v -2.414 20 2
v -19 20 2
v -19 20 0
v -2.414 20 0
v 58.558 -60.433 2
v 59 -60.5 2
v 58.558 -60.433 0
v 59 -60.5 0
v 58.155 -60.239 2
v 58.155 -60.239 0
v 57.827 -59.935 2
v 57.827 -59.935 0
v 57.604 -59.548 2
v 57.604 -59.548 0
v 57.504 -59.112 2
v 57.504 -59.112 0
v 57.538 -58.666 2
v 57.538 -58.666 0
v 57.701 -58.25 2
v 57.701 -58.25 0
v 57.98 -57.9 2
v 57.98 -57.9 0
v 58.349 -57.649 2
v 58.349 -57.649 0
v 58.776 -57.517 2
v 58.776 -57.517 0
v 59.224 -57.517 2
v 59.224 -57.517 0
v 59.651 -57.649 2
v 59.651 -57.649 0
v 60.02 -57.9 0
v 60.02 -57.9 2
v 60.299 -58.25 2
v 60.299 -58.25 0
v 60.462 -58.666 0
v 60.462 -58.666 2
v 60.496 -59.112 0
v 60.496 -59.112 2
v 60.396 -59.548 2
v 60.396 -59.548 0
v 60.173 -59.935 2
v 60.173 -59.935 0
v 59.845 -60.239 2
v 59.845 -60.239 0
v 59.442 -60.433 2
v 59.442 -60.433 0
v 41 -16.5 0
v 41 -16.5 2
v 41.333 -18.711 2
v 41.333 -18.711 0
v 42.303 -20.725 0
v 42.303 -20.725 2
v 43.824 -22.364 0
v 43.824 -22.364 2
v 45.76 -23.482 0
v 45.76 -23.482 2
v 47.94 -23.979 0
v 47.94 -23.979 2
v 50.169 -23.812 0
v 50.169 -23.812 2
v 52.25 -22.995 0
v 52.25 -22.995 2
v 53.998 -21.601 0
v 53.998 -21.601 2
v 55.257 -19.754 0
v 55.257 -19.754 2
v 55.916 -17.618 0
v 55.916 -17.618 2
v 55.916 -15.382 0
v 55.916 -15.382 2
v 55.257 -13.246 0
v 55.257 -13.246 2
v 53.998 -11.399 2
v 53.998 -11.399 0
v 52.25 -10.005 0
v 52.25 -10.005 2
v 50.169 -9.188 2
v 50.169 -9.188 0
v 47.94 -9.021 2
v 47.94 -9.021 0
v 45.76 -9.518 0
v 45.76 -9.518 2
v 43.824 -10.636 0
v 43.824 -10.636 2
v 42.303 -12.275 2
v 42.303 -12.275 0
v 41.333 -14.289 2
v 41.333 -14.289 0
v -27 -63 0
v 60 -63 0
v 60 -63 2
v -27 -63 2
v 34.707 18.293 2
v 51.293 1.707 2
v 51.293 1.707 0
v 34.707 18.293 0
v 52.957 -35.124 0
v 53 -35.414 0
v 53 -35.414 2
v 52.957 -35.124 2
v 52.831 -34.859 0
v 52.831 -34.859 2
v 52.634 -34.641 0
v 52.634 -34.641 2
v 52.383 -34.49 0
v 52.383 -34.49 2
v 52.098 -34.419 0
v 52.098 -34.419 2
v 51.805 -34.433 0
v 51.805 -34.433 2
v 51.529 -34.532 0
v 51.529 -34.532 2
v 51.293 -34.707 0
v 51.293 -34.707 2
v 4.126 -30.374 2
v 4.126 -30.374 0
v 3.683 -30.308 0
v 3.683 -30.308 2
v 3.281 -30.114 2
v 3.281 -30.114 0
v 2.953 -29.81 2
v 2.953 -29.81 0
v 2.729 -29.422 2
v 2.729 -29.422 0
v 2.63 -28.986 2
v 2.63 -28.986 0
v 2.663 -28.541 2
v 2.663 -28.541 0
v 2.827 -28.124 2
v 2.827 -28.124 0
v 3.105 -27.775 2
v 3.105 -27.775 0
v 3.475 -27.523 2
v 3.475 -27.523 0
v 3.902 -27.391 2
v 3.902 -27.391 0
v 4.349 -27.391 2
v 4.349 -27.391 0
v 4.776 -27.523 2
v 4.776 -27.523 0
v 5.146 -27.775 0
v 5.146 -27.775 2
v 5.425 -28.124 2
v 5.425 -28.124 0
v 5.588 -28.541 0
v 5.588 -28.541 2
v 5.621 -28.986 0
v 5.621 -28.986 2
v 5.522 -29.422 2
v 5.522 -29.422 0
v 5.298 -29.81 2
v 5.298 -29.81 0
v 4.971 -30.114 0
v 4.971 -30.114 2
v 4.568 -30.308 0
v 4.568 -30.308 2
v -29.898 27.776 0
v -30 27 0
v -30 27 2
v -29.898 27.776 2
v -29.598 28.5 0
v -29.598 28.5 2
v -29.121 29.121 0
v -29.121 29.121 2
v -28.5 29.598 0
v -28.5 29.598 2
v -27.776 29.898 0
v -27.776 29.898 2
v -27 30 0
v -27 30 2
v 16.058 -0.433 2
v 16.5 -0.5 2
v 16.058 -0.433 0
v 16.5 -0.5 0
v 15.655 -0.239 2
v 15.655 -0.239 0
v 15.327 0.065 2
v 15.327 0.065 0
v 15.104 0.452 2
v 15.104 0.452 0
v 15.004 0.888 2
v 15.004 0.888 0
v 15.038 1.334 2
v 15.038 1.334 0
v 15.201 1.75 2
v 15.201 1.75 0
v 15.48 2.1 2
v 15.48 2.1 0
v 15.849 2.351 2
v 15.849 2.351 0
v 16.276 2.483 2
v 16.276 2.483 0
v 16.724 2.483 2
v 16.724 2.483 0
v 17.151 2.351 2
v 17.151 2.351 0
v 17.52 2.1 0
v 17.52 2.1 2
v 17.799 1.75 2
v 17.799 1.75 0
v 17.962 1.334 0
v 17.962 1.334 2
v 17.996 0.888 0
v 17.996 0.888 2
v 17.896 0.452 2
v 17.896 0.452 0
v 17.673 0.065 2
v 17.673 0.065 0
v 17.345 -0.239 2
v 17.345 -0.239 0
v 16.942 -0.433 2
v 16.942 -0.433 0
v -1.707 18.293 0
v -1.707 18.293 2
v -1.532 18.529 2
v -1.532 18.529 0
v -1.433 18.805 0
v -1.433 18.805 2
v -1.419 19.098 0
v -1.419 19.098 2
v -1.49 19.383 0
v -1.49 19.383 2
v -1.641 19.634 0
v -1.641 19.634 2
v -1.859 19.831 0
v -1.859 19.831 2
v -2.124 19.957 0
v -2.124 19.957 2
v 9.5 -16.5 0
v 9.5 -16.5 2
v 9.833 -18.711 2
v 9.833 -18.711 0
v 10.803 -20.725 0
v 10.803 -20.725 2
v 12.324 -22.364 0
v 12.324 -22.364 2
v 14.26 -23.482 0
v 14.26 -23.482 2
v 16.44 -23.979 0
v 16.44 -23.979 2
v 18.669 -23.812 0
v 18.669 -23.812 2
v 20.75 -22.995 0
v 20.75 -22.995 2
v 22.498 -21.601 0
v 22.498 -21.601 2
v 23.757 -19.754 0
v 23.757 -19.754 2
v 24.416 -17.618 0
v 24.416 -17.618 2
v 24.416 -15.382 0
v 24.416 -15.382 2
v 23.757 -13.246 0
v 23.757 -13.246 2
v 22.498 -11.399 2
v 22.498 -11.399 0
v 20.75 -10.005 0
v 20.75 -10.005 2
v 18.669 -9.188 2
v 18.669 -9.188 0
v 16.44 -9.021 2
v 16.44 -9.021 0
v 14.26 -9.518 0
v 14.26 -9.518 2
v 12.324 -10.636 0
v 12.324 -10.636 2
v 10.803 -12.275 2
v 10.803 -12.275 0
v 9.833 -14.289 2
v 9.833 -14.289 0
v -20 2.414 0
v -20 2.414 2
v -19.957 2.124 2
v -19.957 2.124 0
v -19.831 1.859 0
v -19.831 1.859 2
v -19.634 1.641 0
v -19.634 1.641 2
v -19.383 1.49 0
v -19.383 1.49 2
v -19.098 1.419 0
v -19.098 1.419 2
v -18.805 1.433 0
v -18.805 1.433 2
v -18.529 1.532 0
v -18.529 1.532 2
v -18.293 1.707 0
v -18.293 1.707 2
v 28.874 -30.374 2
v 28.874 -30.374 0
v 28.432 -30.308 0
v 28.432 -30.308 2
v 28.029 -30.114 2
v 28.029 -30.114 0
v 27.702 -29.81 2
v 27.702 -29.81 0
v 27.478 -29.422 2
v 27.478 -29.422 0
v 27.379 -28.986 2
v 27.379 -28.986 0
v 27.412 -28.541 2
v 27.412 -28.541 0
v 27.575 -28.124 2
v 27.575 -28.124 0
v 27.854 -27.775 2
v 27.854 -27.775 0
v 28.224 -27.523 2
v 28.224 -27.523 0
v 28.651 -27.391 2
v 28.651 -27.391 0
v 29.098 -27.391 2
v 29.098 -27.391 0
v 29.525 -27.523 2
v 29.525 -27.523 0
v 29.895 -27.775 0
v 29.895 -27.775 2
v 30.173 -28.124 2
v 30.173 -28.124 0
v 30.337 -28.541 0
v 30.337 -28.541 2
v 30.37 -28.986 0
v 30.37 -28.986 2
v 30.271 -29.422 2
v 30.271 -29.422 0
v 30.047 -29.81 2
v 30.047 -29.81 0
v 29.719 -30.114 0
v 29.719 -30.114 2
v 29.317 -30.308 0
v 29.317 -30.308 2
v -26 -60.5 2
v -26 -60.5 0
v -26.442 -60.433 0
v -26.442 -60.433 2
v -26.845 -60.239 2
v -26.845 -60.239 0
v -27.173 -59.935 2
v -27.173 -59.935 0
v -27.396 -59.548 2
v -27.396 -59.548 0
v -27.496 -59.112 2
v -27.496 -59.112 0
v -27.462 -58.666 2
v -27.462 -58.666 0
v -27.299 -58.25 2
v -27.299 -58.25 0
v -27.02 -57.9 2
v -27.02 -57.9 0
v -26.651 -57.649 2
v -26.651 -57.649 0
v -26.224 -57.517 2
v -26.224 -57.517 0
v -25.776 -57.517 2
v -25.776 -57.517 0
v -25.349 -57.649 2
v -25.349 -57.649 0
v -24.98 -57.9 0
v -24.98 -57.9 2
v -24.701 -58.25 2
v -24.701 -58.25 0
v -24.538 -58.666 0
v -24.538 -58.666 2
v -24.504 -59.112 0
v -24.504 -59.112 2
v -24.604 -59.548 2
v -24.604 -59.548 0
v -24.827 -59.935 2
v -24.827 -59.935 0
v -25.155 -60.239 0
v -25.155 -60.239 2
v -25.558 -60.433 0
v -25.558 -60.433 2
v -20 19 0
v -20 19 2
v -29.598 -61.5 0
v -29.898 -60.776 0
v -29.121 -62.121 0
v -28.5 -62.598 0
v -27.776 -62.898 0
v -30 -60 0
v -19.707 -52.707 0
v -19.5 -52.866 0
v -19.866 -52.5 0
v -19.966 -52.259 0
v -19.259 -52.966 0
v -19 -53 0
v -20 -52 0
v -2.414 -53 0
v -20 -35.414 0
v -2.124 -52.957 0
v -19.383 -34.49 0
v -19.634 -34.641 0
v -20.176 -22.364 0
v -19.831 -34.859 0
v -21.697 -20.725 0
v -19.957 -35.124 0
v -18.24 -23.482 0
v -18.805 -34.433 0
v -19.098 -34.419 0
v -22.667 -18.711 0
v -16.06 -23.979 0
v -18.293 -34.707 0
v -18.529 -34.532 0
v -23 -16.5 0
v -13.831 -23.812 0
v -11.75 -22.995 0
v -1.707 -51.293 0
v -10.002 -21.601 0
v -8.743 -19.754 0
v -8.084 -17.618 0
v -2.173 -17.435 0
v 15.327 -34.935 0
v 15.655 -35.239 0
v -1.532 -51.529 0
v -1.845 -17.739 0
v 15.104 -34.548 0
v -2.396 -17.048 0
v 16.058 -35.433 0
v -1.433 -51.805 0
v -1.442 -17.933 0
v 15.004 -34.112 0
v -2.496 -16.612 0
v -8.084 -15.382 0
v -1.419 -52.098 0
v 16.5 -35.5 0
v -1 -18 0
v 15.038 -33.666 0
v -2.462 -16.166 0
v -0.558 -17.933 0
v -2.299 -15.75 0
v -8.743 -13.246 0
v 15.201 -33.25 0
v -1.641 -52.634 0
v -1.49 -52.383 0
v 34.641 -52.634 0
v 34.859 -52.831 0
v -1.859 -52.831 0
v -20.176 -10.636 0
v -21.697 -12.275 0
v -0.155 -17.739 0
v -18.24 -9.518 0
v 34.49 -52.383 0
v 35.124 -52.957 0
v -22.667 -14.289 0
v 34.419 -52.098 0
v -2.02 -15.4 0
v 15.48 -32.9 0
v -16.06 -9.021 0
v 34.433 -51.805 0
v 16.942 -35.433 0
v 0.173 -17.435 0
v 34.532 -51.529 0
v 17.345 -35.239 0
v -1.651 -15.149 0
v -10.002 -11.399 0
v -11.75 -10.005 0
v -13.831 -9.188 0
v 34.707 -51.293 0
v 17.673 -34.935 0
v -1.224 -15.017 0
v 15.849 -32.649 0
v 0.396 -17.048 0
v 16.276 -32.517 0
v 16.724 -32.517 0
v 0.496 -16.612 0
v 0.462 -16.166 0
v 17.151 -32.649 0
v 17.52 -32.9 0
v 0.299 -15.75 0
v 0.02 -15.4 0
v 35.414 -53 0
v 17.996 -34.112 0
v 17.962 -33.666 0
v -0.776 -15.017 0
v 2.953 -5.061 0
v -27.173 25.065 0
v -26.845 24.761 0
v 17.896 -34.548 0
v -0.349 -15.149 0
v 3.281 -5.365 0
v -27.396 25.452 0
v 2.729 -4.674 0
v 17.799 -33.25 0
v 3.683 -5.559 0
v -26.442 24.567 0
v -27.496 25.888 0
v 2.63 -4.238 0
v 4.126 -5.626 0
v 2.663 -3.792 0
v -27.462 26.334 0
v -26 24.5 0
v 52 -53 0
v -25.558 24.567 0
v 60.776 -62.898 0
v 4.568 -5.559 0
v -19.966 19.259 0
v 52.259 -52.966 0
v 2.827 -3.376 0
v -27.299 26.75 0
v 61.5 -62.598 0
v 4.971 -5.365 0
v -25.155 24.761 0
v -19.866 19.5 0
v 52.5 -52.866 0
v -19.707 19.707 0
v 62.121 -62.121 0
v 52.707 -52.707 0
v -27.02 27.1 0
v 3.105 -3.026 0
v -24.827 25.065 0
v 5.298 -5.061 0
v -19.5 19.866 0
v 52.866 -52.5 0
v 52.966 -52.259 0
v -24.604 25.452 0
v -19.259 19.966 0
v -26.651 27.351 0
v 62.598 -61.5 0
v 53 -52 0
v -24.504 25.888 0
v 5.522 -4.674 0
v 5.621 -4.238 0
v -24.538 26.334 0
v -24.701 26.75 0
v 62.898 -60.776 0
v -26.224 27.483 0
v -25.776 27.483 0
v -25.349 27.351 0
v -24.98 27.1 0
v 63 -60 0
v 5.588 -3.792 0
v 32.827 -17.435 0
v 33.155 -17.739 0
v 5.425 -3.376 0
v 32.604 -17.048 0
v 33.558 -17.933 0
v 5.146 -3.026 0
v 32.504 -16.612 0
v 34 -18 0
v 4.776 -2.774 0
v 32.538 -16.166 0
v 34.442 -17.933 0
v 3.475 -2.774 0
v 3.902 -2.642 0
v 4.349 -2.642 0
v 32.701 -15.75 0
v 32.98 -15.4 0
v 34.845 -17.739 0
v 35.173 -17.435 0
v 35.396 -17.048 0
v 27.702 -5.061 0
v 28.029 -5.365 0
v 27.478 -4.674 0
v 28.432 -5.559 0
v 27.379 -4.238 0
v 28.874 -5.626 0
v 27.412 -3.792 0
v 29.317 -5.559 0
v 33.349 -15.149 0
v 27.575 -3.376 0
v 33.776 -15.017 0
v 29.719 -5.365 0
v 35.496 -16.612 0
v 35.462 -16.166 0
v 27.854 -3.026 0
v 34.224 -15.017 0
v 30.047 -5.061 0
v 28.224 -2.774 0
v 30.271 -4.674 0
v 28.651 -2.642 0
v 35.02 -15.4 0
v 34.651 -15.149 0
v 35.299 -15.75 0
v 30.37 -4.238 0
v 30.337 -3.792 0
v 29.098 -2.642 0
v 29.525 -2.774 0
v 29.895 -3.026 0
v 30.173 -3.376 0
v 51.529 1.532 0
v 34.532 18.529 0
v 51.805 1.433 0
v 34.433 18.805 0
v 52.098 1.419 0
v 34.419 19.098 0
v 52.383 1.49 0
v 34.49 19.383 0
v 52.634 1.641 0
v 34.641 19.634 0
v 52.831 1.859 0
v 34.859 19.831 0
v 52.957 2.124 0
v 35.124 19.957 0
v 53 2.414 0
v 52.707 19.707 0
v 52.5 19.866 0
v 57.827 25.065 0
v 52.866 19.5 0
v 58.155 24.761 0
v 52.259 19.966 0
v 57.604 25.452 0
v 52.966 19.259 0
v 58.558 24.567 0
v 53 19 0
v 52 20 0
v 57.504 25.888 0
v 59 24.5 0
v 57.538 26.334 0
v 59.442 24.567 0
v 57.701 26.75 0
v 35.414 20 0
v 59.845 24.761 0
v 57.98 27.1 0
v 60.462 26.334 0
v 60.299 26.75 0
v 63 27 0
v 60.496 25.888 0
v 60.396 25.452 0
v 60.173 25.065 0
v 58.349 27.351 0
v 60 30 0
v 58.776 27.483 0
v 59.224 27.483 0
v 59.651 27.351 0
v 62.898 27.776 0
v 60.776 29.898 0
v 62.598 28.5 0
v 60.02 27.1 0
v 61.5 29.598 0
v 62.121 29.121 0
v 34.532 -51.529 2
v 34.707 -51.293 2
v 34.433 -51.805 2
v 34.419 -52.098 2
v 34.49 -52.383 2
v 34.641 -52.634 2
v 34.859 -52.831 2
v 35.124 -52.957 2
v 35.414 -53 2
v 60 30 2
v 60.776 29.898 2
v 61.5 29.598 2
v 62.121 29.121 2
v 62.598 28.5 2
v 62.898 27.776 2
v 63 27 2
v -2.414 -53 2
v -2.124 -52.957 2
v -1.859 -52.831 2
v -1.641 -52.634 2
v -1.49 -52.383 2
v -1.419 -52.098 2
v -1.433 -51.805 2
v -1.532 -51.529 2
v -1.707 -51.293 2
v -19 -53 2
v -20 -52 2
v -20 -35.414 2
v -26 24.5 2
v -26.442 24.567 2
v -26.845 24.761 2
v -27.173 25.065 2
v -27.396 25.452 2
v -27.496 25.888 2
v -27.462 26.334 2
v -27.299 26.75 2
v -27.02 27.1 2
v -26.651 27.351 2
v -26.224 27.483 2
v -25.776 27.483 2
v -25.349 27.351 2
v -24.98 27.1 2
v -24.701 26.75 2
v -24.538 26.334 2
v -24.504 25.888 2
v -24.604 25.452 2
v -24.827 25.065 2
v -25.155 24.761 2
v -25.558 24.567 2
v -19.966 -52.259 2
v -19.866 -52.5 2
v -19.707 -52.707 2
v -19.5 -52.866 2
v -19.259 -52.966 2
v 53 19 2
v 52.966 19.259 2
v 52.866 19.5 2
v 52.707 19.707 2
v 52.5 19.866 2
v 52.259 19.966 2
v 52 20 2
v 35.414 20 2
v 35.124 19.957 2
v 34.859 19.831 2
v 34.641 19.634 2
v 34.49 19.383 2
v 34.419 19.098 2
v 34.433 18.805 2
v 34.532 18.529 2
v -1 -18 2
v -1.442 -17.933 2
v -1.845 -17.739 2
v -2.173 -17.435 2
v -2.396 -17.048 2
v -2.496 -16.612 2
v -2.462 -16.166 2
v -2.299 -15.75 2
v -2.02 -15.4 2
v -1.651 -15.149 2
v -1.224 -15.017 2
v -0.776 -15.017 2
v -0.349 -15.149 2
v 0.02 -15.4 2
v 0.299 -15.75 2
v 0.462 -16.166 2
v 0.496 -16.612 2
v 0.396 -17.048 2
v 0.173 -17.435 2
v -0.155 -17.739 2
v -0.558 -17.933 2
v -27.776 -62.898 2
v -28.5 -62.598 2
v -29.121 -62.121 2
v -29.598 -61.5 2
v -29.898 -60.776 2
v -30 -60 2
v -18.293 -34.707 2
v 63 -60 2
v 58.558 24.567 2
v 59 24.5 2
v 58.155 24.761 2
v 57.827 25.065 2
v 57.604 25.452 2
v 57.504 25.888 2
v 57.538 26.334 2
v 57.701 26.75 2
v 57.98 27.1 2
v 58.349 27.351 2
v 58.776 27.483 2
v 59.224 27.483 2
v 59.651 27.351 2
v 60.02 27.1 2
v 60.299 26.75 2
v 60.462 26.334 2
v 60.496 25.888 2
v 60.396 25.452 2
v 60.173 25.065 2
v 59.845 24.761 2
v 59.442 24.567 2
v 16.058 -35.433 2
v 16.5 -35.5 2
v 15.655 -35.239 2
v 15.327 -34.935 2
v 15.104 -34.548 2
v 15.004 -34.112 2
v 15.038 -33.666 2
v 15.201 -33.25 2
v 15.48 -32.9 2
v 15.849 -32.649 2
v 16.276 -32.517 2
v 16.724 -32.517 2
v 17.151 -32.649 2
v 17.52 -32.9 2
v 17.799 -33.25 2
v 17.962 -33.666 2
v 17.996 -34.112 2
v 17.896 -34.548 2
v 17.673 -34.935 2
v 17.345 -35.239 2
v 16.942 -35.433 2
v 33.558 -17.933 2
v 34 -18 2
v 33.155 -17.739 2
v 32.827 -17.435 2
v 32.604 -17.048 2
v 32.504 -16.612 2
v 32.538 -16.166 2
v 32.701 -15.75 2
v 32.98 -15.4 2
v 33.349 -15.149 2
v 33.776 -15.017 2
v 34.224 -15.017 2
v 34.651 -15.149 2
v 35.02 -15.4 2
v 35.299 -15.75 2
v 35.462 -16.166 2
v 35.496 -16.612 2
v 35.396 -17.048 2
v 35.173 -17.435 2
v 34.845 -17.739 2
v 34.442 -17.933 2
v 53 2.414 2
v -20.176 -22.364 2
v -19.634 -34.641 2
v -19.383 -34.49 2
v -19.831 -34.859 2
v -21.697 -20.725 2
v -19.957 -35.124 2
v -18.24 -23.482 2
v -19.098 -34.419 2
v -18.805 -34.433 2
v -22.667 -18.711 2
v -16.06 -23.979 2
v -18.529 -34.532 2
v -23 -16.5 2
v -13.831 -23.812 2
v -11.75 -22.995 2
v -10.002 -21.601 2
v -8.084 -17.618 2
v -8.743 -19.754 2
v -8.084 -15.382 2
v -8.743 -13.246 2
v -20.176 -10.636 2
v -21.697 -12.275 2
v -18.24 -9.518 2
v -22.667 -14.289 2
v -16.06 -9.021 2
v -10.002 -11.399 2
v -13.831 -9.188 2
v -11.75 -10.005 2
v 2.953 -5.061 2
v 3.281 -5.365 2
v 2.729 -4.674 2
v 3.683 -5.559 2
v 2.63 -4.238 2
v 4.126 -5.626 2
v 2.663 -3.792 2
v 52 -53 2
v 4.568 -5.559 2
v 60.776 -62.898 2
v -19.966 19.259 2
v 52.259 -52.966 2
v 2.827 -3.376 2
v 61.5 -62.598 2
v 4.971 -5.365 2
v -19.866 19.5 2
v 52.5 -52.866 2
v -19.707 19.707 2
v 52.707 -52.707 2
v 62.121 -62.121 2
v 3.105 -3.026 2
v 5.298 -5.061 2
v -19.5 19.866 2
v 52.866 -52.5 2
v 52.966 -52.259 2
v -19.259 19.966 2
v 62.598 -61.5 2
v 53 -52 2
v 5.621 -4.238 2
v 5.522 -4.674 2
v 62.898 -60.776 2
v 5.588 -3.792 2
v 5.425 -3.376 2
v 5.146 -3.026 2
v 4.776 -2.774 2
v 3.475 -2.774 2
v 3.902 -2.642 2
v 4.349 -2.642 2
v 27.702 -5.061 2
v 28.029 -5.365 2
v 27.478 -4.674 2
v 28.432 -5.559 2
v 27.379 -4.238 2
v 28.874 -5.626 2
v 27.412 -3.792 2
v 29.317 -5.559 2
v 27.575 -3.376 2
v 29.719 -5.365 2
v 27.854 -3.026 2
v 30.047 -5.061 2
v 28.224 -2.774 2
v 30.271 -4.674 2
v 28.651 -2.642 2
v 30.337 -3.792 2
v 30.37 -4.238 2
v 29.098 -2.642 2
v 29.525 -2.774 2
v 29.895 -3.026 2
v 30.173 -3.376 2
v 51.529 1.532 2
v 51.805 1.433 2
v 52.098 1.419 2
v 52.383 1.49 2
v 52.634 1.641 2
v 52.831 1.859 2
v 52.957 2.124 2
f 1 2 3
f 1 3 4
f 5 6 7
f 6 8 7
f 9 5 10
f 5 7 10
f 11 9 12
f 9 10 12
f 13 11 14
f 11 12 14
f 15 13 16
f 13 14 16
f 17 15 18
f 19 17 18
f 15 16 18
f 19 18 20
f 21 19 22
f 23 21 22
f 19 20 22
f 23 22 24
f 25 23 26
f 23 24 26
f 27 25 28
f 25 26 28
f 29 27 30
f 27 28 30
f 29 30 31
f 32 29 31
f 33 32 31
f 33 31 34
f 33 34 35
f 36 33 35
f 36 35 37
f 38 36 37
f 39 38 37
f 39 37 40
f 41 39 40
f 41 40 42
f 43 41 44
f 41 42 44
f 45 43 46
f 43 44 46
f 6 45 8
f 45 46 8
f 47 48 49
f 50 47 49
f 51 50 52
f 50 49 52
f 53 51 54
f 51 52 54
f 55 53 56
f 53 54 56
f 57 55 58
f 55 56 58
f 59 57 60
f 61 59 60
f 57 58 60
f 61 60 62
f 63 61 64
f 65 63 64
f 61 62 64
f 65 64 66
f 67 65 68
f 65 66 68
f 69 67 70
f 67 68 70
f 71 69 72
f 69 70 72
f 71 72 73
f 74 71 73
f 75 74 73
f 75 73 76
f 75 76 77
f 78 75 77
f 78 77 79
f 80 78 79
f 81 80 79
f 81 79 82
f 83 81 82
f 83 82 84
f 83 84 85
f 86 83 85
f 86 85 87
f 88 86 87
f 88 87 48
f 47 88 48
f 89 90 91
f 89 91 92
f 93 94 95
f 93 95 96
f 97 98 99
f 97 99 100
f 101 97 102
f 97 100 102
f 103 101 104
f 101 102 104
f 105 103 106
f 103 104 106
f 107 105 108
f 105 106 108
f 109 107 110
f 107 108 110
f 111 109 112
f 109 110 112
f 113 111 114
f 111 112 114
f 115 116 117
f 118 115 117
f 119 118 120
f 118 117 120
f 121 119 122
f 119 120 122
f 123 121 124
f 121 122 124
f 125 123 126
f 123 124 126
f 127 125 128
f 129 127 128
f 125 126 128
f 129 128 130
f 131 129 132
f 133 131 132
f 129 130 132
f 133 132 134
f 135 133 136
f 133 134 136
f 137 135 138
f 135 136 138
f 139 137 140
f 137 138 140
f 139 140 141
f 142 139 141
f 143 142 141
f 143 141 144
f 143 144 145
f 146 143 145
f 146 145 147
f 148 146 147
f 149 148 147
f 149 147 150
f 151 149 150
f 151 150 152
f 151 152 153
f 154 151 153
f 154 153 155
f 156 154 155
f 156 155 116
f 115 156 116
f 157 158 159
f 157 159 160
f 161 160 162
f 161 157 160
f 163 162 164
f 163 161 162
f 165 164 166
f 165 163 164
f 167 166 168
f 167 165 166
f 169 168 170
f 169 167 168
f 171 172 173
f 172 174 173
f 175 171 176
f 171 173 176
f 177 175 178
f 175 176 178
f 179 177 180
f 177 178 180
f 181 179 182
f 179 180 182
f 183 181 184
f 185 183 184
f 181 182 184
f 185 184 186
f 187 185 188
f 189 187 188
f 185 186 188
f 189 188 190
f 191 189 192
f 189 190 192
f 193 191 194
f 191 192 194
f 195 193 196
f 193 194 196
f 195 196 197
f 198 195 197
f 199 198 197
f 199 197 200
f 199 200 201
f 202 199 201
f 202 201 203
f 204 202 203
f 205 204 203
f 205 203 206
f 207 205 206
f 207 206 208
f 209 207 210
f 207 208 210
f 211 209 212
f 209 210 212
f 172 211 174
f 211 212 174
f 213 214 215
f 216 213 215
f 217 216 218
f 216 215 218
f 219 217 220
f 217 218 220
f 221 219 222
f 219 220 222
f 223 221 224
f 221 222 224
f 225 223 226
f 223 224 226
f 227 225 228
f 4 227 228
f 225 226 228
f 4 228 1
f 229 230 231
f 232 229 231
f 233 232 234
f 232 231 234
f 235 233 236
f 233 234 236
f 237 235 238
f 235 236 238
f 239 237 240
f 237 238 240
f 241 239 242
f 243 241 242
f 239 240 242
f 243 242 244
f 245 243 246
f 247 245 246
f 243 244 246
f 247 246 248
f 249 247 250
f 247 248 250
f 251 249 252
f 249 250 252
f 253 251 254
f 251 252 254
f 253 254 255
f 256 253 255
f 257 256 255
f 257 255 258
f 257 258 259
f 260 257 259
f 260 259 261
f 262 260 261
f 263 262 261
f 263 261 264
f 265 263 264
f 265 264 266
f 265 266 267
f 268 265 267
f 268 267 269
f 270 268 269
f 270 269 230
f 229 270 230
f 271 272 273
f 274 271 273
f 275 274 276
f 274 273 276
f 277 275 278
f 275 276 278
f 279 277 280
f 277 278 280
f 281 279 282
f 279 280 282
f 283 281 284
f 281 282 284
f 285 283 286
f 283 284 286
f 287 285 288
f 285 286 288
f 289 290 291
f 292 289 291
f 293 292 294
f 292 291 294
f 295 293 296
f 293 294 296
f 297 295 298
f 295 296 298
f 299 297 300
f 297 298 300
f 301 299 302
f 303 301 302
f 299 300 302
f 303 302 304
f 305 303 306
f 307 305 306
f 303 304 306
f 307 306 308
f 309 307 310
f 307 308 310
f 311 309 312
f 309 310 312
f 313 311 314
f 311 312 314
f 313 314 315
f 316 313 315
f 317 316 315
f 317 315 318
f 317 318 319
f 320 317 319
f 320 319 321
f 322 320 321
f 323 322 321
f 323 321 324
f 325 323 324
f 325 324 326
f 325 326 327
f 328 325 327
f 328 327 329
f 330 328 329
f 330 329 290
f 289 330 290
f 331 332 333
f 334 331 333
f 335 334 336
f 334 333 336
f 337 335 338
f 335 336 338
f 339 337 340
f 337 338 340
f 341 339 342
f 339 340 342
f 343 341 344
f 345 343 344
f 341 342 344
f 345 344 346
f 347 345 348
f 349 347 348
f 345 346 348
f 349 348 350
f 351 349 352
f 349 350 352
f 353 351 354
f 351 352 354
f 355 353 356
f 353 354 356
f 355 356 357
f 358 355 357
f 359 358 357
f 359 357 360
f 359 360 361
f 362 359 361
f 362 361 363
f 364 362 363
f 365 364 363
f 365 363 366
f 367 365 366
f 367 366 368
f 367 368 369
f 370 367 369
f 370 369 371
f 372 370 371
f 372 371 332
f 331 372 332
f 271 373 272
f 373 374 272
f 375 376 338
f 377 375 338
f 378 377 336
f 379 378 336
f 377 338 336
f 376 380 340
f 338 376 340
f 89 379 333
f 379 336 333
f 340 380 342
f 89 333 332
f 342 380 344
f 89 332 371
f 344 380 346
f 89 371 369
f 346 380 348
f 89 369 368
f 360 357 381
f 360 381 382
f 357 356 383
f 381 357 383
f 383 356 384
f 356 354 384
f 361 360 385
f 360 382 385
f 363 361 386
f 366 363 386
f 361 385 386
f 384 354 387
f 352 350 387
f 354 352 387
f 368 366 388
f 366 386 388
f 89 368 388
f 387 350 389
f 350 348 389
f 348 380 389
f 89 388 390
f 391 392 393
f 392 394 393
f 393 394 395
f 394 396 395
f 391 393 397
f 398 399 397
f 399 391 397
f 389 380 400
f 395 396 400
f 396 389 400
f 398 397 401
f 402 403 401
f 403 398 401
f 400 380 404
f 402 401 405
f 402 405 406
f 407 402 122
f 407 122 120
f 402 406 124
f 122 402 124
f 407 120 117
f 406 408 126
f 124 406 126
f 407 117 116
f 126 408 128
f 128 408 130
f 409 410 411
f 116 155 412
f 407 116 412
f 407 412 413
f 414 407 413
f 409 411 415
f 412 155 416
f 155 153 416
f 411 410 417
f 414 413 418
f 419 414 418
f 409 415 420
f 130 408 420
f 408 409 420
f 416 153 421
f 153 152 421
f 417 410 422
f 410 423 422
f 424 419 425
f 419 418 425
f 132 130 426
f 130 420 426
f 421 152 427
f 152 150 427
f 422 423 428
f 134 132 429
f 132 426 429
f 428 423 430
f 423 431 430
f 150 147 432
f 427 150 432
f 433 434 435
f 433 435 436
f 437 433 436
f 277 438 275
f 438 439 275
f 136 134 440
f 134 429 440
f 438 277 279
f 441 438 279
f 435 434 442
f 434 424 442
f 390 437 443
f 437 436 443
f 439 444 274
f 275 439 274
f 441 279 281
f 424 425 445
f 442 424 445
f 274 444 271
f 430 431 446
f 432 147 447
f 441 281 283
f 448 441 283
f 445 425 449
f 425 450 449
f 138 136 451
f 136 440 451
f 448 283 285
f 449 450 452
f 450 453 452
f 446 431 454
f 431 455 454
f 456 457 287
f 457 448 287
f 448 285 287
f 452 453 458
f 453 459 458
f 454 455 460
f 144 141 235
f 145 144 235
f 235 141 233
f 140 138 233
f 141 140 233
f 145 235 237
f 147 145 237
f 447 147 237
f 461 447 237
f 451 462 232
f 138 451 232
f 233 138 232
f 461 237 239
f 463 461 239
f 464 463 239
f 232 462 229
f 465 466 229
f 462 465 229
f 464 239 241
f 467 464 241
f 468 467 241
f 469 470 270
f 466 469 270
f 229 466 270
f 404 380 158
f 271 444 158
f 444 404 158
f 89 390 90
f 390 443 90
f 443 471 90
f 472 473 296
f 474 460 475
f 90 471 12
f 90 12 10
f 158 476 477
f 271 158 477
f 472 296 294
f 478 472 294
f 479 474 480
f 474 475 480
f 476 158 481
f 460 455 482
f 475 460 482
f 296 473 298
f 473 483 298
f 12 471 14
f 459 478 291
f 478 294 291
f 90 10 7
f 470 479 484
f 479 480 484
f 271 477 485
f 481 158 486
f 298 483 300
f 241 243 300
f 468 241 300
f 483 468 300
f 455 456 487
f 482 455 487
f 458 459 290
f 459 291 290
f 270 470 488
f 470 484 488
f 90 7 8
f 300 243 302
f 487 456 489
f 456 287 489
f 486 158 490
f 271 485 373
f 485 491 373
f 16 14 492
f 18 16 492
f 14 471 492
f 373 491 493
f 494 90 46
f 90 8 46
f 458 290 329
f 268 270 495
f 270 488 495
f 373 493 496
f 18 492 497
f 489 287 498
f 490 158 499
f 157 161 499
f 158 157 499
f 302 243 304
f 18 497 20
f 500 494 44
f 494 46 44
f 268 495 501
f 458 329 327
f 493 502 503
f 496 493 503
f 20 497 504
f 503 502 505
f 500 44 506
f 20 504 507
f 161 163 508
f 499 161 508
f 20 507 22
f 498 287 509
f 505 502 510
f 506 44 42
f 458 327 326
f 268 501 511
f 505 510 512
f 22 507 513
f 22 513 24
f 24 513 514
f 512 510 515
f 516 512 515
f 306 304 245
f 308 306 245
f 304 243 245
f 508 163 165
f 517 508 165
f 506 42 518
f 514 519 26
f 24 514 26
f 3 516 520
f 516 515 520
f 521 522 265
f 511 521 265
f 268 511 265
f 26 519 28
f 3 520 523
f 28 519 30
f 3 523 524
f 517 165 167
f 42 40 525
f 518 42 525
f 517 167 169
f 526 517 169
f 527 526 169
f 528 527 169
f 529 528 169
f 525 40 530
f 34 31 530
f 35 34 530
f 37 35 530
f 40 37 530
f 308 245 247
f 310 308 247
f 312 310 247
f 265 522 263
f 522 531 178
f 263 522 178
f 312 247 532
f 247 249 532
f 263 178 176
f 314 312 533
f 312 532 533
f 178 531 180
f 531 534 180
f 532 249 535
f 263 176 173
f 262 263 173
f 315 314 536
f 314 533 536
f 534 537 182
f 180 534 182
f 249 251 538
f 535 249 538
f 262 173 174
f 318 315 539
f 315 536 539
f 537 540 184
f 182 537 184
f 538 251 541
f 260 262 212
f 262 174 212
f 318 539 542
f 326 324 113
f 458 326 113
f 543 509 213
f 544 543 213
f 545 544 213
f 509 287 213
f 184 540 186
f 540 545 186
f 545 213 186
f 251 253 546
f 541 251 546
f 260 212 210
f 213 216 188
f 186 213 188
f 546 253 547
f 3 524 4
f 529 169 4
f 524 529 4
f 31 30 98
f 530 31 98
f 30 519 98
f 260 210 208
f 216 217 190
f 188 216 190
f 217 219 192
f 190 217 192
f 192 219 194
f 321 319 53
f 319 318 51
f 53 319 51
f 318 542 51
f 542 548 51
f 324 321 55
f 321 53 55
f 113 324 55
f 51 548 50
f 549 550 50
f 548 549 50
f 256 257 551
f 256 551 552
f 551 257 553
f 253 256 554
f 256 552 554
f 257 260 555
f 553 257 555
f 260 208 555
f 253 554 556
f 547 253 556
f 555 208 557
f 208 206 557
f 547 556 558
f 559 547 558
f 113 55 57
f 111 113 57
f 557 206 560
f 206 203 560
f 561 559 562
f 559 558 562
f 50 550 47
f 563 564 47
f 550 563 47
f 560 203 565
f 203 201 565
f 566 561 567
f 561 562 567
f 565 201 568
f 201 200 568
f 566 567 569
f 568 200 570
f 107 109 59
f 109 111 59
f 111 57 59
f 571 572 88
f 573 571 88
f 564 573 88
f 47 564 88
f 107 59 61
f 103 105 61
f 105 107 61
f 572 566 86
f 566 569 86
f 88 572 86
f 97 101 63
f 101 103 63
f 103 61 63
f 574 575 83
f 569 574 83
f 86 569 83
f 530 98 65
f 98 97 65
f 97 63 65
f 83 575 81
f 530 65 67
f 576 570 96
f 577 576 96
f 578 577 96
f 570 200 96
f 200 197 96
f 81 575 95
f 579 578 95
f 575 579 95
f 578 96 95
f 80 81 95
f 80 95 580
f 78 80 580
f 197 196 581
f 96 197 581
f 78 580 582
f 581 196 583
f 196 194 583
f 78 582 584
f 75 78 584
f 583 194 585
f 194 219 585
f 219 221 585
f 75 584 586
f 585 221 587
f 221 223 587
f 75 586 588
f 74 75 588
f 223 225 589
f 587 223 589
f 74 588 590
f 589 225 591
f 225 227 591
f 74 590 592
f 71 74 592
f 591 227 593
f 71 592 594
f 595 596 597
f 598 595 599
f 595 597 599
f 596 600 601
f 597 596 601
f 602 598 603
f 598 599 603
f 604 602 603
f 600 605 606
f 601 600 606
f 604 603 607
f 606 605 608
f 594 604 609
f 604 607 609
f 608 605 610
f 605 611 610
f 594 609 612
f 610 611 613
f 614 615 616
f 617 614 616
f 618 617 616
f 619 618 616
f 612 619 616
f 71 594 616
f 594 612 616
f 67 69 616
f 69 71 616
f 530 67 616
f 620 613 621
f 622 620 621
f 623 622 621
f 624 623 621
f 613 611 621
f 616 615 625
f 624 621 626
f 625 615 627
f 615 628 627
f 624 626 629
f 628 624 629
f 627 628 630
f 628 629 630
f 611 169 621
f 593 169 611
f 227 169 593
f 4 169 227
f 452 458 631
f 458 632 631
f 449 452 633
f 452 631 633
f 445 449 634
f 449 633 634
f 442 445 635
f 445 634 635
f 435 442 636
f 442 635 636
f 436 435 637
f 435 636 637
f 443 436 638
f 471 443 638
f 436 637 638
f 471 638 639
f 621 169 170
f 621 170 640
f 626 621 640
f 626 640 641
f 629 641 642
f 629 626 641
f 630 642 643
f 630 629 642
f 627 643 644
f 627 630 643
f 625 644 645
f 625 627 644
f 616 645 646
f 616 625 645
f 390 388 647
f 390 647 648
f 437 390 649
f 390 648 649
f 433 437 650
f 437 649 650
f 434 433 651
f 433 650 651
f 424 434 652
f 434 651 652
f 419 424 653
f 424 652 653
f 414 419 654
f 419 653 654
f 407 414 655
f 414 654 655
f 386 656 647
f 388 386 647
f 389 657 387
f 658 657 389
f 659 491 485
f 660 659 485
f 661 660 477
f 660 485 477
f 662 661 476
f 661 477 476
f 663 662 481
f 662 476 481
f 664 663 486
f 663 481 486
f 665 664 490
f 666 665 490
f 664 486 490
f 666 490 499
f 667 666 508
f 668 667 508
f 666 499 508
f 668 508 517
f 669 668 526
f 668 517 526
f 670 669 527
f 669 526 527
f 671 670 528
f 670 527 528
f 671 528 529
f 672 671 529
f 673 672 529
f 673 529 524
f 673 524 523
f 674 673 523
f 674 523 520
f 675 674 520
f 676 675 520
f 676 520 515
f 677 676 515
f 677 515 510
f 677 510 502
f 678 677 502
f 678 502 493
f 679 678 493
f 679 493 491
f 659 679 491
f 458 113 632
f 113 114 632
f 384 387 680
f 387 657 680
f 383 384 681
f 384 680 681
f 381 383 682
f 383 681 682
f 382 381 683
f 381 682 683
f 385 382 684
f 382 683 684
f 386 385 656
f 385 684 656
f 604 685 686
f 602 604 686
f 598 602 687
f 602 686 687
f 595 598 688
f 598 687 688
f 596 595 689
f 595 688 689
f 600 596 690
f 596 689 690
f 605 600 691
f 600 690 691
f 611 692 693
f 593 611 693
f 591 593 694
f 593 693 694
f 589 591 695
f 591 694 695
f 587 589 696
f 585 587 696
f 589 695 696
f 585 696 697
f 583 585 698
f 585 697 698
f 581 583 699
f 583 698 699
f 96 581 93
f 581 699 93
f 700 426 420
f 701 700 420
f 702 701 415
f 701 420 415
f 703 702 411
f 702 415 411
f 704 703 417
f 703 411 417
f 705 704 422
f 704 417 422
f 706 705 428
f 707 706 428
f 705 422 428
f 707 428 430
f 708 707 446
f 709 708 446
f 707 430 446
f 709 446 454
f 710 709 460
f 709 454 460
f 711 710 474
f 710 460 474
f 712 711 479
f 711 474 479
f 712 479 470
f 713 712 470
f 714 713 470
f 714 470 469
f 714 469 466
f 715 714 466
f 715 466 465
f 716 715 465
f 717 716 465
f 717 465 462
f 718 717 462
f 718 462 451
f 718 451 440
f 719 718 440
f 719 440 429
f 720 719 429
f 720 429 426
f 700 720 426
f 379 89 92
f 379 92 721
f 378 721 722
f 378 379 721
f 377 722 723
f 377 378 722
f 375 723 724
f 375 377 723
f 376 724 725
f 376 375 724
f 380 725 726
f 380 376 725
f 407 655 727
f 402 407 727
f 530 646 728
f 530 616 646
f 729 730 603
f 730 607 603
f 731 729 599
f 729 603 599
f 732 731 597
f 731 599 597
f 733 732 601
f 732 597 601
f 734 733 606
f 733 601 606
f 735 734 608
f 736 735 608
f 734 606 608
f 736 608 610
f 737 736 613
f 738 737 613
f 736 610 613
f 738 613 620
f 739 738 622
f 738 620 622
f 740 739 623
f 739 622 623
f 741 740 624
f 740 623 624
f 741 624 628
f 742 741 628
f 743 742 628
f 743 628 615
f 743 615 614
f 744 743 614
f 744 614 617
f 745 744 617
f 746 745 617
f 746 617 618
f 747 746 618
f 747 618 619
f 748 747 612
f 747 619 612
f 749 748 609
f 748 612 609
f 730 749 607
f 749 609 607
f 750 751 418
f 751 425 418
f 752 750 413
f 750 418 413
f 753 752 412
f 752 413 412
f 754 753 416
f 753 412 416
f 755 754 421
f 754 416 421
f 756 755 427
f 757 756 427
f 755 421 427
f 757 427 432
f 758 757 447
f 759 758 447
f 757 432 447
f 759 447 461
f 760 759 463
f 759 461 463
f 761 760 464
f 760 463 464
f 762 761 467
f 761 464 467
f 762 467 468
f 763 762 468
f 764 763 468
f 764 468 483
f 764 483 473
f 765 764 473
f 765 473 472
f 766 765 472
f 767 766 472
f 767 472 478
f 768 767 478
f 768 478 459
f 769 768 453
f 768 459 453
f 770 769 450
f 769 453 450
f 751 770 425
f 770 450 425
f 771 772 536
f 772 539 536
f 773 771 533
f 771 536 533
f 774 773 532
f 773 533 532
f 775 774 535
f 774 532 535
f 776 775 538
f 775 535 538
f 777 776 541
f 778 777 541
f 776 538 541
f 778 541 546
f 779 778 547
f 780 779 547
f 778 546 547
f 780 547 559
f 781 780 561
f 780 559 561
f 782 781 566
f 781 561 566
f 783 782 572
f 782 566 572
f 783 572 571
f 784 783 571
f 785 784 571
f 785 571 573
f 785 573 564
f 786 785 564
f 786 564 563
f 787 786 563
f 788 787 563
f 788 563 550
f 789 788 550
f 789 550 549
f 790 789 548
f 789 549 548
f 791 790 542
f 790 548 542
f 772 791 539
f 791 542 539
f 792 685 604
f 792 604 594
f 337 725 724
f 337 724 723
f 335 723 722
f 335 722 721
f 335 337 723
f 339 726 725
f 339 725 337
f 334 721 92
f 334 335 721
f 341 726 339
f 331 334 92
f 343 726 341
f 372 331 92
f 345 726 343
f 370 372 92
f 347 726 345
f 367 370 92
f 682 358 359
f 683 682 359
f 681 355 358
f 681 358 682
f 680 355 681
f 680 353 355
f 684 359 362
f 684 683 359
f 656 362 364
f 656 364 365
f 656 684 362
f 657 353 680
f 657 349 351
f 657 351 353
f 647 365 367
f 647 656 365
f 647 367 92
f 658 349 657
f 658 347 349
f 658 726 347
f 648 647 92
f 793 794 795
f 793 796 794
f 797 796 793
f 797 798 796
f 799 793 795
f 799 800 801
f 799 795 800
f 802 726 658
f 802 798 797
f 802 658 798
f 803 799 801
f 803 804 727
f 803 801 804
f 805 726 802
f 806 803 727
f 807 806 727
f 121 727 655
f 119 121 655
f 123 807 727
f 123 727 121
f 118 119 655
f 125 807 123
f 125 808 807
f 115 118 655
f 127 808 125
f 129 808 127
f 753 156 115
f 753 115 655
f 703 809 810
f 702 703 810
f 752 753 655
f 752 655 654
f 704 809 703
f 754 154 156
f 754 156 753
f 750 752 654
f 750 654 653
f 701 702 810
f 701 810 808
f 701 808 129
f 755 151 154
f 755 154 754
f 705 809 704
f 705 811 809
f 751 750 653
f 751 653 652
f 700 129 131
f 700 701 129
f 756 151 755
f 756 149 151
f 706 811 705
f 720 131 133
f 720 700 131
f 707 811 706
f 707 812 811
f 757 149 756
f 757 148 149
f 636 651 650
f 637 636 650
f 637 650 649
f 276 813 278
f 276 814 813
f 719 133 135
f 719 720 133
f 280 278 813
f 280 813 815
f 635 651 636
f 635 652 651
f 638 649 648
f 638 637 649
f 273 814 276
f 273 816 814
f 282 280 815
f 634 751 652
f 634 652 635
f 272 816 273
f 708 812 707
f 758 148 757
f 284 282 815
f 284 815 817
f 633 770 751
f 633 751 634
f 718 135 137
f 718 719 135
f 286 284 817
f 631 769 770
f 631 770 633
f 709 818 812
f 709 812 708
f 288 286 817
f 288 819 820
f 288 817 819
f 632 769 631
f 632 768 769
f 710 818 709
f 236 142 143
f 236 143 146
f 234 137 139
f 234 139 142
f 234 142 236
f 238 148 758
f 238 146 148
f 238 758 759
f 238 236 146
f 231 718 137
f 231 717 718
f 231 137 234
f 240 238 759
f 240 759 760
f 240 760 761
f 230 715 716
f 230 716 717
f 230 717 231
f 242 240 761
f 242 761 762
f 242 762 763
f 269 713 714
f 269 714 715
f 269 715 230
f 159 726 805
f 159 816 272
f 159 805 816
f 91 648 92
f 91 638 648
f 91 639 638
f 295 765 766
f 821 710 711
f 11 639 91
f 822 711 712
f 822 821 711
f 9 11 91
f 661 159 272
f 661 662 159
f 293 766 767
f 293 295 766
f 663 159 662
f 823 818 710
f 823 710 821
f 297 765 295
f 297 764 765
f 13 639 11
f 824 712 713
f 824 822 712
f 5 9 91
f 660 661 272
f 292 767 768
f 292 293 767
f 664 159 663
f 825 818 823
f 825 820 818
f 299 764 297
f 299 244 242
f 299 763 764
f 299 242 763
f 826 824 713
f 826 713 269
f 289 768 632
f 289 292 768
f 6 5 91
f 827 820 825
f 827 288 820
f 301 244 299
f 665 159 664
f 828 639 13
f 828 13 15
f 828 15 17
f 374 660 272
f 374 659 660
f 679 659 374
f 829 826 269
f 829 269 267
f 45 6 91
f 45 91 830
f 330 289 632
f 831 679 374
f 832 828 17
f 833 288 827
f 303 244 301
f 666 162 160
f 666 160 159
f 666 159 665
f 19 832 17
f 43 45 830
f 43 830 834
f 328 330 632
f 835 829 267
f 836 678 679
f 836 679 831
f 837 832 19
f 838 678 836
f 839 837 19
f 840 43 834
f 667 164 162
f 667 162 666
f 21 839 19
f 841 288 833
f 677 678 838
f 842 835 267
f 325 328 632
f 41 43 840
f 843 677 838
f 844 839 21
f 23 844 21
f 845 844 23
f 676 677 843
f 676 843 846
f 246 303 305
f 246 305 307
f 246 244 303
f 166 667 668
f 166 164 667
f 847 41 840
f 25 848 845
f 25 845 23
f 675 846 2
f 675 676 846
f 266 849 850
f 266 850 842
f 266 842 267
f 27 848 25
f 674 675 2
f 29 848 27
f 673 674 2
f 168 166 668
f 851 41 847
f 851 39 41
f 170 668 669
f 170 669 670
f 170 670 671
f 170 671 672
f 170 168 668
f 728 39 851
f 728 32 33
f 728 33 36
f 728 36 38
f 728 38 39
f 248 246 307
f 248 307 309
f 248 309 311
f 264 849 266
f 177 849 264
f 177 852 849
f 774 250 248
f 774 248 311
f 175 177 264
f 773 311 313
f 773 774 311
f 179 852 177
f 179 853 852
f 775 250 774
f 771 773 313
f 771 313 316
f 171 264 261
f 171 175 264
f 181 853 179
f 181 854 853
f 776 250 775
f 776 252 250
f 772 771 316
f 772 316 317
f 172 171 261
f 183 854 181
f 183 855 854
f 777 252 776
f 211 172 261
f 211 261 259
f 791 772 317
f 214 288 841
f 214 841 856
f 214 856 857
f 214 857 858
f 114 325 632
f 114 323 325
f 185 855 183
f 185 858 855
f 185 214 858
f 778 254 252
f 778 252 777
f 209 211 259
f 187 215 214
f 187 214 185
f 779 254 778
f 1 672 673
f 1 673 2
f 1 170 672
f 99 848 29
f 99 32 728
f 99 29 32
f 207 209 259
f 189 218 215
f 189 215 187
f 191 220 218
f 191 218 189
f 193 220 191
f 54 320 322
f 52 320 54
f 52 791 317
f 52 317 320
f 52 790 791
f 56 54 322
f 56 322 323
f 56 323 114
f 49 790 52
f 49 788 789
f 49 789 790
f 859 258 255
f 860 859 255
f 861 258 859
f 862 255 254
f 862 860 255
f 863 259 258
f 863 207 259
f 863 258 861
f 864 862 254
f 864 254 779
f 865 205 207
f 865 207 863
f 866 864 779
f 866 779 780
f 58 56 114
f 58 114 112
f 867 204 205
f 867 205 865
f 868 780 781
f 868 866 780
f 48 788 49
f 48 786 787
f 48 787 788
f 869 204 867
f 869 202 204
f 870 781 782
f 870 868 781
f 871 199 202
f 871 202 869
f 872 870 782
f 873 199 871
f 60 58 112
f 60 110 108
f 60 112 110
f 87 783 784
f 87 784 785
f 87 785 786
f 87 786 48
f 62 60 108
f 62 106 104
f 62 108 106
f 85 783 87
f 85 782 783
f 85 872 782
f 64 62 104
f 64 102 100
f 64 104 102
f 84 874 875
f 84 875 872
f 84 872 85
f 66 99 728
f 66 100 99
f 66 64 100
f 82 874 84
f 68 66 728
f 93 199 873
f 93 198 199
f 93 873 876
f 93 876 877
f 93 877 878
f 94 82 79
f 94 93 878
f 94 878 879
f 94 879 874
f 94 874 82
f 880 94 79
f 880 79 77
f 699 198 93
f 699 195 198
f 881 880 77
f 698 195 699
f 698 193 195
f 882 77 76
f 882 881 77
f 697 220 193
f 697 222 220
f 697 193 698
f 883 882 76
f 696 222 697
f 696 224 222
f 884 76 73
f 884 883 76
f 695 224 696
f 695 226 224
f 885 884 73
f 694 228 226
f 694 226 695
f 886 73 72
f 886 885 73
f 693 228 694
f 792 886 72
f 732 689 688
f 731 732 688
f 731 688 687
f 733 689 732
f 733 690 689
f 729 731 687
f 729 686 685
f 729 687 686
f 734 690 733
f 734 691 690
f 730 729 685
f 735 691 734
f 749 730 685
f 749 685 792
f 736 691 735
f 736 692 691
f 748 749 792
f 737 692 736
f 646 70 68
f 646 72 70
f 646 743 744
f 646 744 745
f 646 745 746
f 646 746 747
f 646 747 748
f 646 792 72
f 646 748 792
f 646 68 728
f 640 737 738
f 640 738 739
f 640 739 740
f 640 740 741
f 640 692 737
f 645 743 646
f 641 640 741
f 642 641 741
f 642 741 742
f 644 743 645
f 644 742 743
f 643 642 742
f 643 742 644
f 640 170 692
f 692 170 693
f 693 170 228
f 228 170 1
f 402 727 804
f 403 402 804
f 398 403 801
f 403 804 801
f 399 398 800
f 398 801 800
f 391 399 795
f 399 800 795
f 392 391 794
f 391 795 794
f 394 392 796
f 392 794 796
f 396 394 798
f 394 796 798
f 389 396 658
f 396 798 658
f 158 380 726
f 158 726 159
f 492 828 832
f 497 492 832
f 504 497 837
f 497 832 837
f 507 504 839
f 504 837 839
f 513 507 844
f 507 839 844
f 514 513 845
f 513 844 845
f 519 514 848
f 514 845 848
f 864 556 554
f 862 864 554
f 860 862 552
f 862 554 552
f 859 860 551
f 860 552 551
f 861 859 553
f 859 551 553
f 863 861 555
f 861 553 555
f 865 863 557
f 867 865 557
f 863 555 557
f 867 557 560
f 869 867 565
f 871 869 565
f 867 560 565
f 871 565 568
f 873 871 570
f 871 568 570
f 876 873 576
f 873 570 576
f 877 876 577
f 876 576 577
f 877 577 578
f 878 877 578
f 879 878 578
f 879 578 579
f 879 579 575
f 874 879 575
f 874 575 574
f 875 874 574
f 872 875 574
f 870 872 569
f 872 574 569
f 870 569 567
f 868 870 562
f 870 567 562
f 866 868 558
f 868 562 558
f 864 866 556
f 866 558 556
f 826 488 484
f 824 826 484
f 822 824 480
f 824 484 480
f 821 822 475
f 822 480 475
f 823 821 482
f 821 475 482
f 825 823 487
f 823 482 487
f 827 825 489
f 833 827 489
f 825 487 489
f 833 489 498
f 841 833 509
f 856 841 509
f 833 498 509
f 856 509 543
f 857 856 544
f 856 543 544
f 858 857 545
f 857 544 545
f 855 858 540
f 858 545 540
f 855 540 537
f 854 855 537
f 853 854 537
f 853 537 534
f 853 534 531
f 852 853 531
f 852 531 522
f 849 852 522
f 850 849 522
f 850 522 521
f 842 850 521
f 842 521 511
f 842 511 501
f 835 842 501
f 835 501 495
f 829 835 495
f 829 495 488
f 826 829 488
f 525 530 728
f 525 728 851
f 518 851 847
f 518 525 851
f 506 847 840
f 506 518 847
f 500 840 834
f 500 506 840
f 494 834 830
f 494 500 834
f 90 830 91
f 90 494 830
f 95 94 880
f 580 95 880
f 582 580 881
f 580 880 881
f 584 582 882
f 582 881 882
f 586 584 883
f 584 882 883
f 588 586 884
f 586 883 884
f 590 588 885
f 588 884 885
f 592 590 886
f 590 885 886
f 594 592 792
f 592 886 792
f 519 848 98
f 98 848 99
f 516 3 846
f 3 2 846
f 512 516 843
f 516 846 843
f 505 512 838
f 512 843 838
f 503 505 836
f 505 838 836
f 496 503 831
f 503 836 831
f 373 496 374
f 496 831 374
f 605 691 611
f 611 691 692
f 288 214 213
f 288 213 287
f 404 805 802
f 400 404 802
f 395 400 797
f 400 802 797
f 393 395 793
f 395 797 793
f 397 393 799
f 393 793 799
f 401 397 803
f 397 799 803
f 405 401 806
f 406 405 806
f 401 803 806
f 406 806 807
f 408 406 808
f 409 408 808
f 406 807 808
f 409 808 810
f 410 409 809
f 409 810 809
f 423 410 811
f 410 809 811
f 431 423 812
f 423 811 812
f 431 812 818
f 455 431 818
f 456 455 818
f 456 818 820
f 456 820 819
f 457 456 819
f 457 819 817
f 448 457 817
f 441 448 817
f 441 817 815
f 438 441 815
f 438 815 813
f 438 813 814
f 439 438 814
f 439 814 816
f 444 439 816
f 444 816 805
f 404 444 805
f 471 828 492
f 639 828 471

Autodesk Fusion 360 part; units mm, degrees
sketch "Sketch1" plane through (0, 0, 0) normal (0, 0, 1) x (1, 0, 0)
  line L0 (-27, 30) -> (60, 30)
  line L1 (63, 27) -> (63, -60)
  line L2 (60, -63) -> (-27, -63)
  line L3 (-30, -60) -> (-30, 27)
  arc A0 (-27, 30) -> (-30, 27) centre (-27, 27) ccw
  arc A1 (63, 27) -> (60, 30) centre (60, 27) ccw
  arc A2 (-30, -60) -> (-27, -63) centre (-27, -60) ccw
  arc A3 (60, -63) -> (63, -60) centre (60, -60) ccw
  point P0 (-30, 30)
  point P1 (63, 30)
  point P2 (-30, -63)
  dimension "d1" = 93
  dimension "d2" = 93
  dimension "d3" = 3
  dimension "d4" = 3
extrude "Extrude1" add sketch "Sketch1" along normal blind 2
sketch "Sketch2" plane through (0, 0, 2) normal (0, 0, 1) x (-1, 0, 0)
  arc A0 (30, 60) -> (27, 63) centre (27, 60) ccw
  line L0 (27, 63) -> (-60, 63)
  arc A1 (-60, 63) -> (-63, 60) centre (-60, 60) ccw
  line L1 (-63, 60) -> (-63, -27)
  arc A2 (-63, -27) -> (-60, -30) centre (-60, -27) ccw
  line L2 (-60, -30) -> (27, -30)
  arc A3 (27, -30) -> (30, -27) centre (27, -27) ccw
  line L3 (30, -27) -> (30, 60)
  point P0 (26, -26)
  point P1 (-59, -26)
  point P2 (26, 59)
  point P3 (-60, 60)
  point P4 (-59, 59)
  point P5 (-57.2336, -24.9323)
  dimension "d18" = 85
  dimension "d19" = 4
  dimension "d20" = 4
  dimension "d21" = 4
  dimension "d22" = 4
  dimension "d23" = 4
  dimension "d24" = 4
  dimension "d25" = 85
  dimension "d26" = 4
hole "Hole2" at (59, -59, 2) at (-26, -59, 2) at (-26, 26, 2) at (59, 26, 2) direction (0, 0, -1) diameter 3 depth 2 tip angle 118
sketch "Sketch3" plane through (0, 0, 2) normal (0, 0, 1) x (-1, 0, 0)
  line L0 (-60, -30) -> (27, -30)
  line L1 (30, -27) -> (30, 60)
  line L2 (27, 63) -> (-60, 63)
  point P0 (-16.5, 16.5)
  point P1 (-16.5, -1)
  point P2 (1, 16.5)
  point P3 (-16.5, 34)
  point P4 (-34, 16.5)
  point P5 (-28.8744, 28.8744)
  point P6 (-4.1256, 28.8744)
  point P7 (-4.1256, 4.1256)
  point P8 (-28.8744, 4.1256)
  point P9 (-34, 16.5)
  point P10 (-16.5, 34)
  point P11 (1, 16.5)
  point P12 (-16.5, -1)
  point P13 (-28.8744, 4.1256)
  point P14 (-28.8744, 28.8744)
  point P15 (-4.1256, 28.8744)
  point P16 (-4.1256, 4.1256)
  point P17 (-16.5, -1)
  point P18 (-34, 16.5)
  point P19 (-16.5, 34)
  point P20 (1, 16.5)
  point P21 (-4.1256, 4.1256)
  point P22 (-28.8744, 4.1256)
  point P23 (-28.8744, 28.8744)
  point P24 (-4.1256, 28.8744)
  point P25 (1, 16.5)
  point P26 (-16.5, -1)
  point P27 (-34, 16.5)
  point P28 (-16.5, 34)
  point P29 (-4.1256, 28.8744)
  point P30 (-4.1256, 4.1256)
  point P31 (-28.8744, 4.1256)
  point P32 (-28.8744, 28.8744)
  dimension "d30" = 46.5
  dimension "d31" = 46.5
  dimension "d32" = 17.5
  dimension "d34" = 46.5
  dimension "d35" = 46.5
  dimension "d36" = 46.5
  dimension "d38" = 46.5
  dimension "d39" = 17.5
  dimension "d40" = 17.5
  dimension "d41" = 17.5
  dimension "d47" = 360
hole "Hole3" at (16.5, -34, 2) at (-1, -16.5, 2) at (16.5, 1, 2) at (34, -16.5, 2) at (16.5, -34, 2) at (4.1256, -28.8744, 2) at (4.1256, -4.1256, 2) at (28.8744, -28.8744, 2) at (28.8744, -4.1256, 2) direction (0, 0, -1) diameter 3 depth 25 tip angle 118
sketch "Sketch4" plane through (0, 0, 2) normal (0, 0, 1) x (-1, 0, 0)
sketch "Sketch5" plane through (0, 0, 2) normal (0, 0, 1) x (-1, 0, 0)
  circle A0 centre (-28.8744, 28.8744) radius 1.5
  circle A1 centre (-4.1256, 28.8744) radius 1.5
  circle A2 centre (-34, 16.5) radius 1.5
  circle A3 centre (1, 16.5) radius 1.5
  circle A4 centre (-16.5, 34) radius 1.5
  circle A5 centre (-16.5, -1) radius 1.5
  circle A6 centre (-4.1256, 4.1256) radius 1.5
  circle A7 centre (-28.8744, 4.1256) radius 1.5
  circle A8 centre (26, -26) radius 1.5
  circle A9 centre (-59, 59) radius 1.5
  circle A10 centre (26, 59) radius 1.5
  circle A11 centre (-59, -26) radius 1.5
  arc A12 (30, 60) -> (27, 63) centre (27, 60) ccw
  line L0 (27, 63) -> (-60, 63)
  arc A13 (-60, 63) -> (-63, 60) centre (-60, 60) ccw
  line L1 (-63, 60) -> (-63, -27)
  arc A14 (-63, -27) -> (-60, -30) centre (-60, -27) ccw
  line L2 (-60, -30) -> (27, -30)
  arc A15 (27, -30) -> (30, -27) centre (27, -27) ccw
  line L3 (30, -27) -> (30, 60)
  circle A16 centre (15.5, 16.5) radius 7.5
  circle A17 centre (-48.5, 16.5) radius 7.5
  dimension "d48" = 15
  dimension "d49" = 14.5
  dimension "d50" = 46.5
  dimension "d51" = 15
  dimension "d52" = 46.5
  dimension "d53" = 14.5
extrude "Extrude2" cut sketch "Sketch5" against normal blind 9 contours A16 | A17
sketch "Sketch6" plane through (0, 0, 2) normal (0, 0, 1) x (-1, 0, 0)
  circle A0 centre (-48.5, 16.5) radius 7.5
  circle A1 centre (15.5, 16.5) radius 7.5
  circle A2 centre (-28.8744, 28.8744) radius 1.5
  circle A3 centre (-4.1256, 28.8744) radius 1.5
  circle A4 centre (-34, 16.5) radius 1.5
  circle A5 centre (1, 16.5) radius 1.5
  circle A6 centre (-16.5, 34) radius 1.5
  circle A7 centre (-16.5, -1) radius 1.5
  circle A8 centre (-4.1256, 4.1256) radius 1.5
  circle A9 centre (-28.8744, 4.1256) radius 1.5
  circle A10 centre (26, -26) radius 1.5
  circle A11 centre (-59, 59) radius 1.5
  circle A12 centre (26, 59) radius 1.5
  circle A13 centre (-59, -26) radius 1.5
  arc A14 (30, 60) -> (27, 63) centre (27, 60) ccw
  line L0 (27, 63) -> (-60, 63)
  arc A15 (-60, 63) -> (-63, 60) centre (-60, 60) ccw
  line L1 (-63, 60) -> (-63, -27)
  arc A16 (-63, -27) -> (-60, -30) centre (-60, -27) ccw
  line L2 (-60, -30) -> (27, -30)
  arc A17 (27, -30) -> (30, -27) centre (27, -27) ccw
  line L3 (30, -27) -> (30, 60)
sketch "Sketch7" plane through (0, 0, 2) normal (0, 0, 1) x (-1, 0, 0)
  line L0 (19, -20) -> (2.4142, -20)
  line L1 (1.7071, -18.2929) -> (18.2929, -1.7071)
  line L2 (20, -19) -> (20, -2.4142)
  arc A0 (19, -20) -> (20, -19) centre (19, -19) ccw
  arc A1 (1.7071, -18.2929) -> (2.4142, -20) centre (2.4142, -19) ccw
  arc A2 (20, -2.4142) -> (18.2929, -1.7071) centre (19, -2.4142) ccw
  line L3 (-51.2929, 34.7071) -> (-34.7071, 51.2929)
  arc A3 (-34.7071, 51.2929) -> (-35.4142, 53) centre (-35.4142, 52) ccw
  line L4 (-52, 53) -> (-35.4142, 53)
  line L5 (-53, 52) -> (-53, 35.4142)
  arc A4 (-53, 35.4142) -> (-51.2929, 34.7071) centre (-52, 35.4142) ccw
  arc A5 (-52, 53) -> (-53, 52) centre (-52, 52) ccw
  line L6 (-60, -30) -> (27, -30)
  line L7 (-52, -20) -> (-35.4142, -20)
  arc A6 (-35.4142, -20) -> (-34.7071, -18.2929) centre (-35.4142, -19) ccw
  line L8 (-51.2929, -1.7071) -> (-34.7071, -18.2929)
  arc A7 (-51.2929, -1.7071) -> (-53, -2.4142) centre (-52, -2.4142) ccw
  line L9 (-53, -19) -> (-53, -2.4142)
  line L10 (1.7071, 51.2929) -> (18.2929, 34.7071)
  arc A8 (2.4142, 53) -> (1.7071, 51.2929) centre (2.4142, 52) ccw
  line L11 (19, 53) -> (2.4142, 53)
  arc A9 (20, 52) -> (19, 53) centre (19, 52) ccw
  line L12 (20, 52) -> (20, 35.4142)
  arc A10 (18.2929, 34.7071) -> (20, 35.4142) centre (19, 35.4142) ccw
  arc A11 (-53, -19) -> (-52, -20) centre (-52, -19) ccw
  point P0 (20, -20)
  point P1 (20, 0)
  point P2 (0, -20)
  point P3 (-52, -19)
  dimension "d56" = 1
  dimension "d61" = 1
extrude "Extrude3" cut sketch "Sketch7" against normal blind 5
sketch "Sketch8" plane through (0, 0, 0) normal (0, 0, 1) x (1, 0, 0)
  line L0 (60, 30) -> (-27, 30)
sketch "Sketch9" plane through (0, 0, 0) normal (0, 0, 1) x (1, 0, 0)
sketch "Sketch10" plane through (0, 0, 2) normal (0, 0, 1) x (-1, 0, 0)
  circle A0 centre (-17, 16.5) radius 7.5
  line L0 (-60, -30) -> (27, -30)
  dimension "d62" = 15
  dimension "d63" = 46.5
extrude "Extrude4" cut sketch "Sketch10" against normal blind 10
